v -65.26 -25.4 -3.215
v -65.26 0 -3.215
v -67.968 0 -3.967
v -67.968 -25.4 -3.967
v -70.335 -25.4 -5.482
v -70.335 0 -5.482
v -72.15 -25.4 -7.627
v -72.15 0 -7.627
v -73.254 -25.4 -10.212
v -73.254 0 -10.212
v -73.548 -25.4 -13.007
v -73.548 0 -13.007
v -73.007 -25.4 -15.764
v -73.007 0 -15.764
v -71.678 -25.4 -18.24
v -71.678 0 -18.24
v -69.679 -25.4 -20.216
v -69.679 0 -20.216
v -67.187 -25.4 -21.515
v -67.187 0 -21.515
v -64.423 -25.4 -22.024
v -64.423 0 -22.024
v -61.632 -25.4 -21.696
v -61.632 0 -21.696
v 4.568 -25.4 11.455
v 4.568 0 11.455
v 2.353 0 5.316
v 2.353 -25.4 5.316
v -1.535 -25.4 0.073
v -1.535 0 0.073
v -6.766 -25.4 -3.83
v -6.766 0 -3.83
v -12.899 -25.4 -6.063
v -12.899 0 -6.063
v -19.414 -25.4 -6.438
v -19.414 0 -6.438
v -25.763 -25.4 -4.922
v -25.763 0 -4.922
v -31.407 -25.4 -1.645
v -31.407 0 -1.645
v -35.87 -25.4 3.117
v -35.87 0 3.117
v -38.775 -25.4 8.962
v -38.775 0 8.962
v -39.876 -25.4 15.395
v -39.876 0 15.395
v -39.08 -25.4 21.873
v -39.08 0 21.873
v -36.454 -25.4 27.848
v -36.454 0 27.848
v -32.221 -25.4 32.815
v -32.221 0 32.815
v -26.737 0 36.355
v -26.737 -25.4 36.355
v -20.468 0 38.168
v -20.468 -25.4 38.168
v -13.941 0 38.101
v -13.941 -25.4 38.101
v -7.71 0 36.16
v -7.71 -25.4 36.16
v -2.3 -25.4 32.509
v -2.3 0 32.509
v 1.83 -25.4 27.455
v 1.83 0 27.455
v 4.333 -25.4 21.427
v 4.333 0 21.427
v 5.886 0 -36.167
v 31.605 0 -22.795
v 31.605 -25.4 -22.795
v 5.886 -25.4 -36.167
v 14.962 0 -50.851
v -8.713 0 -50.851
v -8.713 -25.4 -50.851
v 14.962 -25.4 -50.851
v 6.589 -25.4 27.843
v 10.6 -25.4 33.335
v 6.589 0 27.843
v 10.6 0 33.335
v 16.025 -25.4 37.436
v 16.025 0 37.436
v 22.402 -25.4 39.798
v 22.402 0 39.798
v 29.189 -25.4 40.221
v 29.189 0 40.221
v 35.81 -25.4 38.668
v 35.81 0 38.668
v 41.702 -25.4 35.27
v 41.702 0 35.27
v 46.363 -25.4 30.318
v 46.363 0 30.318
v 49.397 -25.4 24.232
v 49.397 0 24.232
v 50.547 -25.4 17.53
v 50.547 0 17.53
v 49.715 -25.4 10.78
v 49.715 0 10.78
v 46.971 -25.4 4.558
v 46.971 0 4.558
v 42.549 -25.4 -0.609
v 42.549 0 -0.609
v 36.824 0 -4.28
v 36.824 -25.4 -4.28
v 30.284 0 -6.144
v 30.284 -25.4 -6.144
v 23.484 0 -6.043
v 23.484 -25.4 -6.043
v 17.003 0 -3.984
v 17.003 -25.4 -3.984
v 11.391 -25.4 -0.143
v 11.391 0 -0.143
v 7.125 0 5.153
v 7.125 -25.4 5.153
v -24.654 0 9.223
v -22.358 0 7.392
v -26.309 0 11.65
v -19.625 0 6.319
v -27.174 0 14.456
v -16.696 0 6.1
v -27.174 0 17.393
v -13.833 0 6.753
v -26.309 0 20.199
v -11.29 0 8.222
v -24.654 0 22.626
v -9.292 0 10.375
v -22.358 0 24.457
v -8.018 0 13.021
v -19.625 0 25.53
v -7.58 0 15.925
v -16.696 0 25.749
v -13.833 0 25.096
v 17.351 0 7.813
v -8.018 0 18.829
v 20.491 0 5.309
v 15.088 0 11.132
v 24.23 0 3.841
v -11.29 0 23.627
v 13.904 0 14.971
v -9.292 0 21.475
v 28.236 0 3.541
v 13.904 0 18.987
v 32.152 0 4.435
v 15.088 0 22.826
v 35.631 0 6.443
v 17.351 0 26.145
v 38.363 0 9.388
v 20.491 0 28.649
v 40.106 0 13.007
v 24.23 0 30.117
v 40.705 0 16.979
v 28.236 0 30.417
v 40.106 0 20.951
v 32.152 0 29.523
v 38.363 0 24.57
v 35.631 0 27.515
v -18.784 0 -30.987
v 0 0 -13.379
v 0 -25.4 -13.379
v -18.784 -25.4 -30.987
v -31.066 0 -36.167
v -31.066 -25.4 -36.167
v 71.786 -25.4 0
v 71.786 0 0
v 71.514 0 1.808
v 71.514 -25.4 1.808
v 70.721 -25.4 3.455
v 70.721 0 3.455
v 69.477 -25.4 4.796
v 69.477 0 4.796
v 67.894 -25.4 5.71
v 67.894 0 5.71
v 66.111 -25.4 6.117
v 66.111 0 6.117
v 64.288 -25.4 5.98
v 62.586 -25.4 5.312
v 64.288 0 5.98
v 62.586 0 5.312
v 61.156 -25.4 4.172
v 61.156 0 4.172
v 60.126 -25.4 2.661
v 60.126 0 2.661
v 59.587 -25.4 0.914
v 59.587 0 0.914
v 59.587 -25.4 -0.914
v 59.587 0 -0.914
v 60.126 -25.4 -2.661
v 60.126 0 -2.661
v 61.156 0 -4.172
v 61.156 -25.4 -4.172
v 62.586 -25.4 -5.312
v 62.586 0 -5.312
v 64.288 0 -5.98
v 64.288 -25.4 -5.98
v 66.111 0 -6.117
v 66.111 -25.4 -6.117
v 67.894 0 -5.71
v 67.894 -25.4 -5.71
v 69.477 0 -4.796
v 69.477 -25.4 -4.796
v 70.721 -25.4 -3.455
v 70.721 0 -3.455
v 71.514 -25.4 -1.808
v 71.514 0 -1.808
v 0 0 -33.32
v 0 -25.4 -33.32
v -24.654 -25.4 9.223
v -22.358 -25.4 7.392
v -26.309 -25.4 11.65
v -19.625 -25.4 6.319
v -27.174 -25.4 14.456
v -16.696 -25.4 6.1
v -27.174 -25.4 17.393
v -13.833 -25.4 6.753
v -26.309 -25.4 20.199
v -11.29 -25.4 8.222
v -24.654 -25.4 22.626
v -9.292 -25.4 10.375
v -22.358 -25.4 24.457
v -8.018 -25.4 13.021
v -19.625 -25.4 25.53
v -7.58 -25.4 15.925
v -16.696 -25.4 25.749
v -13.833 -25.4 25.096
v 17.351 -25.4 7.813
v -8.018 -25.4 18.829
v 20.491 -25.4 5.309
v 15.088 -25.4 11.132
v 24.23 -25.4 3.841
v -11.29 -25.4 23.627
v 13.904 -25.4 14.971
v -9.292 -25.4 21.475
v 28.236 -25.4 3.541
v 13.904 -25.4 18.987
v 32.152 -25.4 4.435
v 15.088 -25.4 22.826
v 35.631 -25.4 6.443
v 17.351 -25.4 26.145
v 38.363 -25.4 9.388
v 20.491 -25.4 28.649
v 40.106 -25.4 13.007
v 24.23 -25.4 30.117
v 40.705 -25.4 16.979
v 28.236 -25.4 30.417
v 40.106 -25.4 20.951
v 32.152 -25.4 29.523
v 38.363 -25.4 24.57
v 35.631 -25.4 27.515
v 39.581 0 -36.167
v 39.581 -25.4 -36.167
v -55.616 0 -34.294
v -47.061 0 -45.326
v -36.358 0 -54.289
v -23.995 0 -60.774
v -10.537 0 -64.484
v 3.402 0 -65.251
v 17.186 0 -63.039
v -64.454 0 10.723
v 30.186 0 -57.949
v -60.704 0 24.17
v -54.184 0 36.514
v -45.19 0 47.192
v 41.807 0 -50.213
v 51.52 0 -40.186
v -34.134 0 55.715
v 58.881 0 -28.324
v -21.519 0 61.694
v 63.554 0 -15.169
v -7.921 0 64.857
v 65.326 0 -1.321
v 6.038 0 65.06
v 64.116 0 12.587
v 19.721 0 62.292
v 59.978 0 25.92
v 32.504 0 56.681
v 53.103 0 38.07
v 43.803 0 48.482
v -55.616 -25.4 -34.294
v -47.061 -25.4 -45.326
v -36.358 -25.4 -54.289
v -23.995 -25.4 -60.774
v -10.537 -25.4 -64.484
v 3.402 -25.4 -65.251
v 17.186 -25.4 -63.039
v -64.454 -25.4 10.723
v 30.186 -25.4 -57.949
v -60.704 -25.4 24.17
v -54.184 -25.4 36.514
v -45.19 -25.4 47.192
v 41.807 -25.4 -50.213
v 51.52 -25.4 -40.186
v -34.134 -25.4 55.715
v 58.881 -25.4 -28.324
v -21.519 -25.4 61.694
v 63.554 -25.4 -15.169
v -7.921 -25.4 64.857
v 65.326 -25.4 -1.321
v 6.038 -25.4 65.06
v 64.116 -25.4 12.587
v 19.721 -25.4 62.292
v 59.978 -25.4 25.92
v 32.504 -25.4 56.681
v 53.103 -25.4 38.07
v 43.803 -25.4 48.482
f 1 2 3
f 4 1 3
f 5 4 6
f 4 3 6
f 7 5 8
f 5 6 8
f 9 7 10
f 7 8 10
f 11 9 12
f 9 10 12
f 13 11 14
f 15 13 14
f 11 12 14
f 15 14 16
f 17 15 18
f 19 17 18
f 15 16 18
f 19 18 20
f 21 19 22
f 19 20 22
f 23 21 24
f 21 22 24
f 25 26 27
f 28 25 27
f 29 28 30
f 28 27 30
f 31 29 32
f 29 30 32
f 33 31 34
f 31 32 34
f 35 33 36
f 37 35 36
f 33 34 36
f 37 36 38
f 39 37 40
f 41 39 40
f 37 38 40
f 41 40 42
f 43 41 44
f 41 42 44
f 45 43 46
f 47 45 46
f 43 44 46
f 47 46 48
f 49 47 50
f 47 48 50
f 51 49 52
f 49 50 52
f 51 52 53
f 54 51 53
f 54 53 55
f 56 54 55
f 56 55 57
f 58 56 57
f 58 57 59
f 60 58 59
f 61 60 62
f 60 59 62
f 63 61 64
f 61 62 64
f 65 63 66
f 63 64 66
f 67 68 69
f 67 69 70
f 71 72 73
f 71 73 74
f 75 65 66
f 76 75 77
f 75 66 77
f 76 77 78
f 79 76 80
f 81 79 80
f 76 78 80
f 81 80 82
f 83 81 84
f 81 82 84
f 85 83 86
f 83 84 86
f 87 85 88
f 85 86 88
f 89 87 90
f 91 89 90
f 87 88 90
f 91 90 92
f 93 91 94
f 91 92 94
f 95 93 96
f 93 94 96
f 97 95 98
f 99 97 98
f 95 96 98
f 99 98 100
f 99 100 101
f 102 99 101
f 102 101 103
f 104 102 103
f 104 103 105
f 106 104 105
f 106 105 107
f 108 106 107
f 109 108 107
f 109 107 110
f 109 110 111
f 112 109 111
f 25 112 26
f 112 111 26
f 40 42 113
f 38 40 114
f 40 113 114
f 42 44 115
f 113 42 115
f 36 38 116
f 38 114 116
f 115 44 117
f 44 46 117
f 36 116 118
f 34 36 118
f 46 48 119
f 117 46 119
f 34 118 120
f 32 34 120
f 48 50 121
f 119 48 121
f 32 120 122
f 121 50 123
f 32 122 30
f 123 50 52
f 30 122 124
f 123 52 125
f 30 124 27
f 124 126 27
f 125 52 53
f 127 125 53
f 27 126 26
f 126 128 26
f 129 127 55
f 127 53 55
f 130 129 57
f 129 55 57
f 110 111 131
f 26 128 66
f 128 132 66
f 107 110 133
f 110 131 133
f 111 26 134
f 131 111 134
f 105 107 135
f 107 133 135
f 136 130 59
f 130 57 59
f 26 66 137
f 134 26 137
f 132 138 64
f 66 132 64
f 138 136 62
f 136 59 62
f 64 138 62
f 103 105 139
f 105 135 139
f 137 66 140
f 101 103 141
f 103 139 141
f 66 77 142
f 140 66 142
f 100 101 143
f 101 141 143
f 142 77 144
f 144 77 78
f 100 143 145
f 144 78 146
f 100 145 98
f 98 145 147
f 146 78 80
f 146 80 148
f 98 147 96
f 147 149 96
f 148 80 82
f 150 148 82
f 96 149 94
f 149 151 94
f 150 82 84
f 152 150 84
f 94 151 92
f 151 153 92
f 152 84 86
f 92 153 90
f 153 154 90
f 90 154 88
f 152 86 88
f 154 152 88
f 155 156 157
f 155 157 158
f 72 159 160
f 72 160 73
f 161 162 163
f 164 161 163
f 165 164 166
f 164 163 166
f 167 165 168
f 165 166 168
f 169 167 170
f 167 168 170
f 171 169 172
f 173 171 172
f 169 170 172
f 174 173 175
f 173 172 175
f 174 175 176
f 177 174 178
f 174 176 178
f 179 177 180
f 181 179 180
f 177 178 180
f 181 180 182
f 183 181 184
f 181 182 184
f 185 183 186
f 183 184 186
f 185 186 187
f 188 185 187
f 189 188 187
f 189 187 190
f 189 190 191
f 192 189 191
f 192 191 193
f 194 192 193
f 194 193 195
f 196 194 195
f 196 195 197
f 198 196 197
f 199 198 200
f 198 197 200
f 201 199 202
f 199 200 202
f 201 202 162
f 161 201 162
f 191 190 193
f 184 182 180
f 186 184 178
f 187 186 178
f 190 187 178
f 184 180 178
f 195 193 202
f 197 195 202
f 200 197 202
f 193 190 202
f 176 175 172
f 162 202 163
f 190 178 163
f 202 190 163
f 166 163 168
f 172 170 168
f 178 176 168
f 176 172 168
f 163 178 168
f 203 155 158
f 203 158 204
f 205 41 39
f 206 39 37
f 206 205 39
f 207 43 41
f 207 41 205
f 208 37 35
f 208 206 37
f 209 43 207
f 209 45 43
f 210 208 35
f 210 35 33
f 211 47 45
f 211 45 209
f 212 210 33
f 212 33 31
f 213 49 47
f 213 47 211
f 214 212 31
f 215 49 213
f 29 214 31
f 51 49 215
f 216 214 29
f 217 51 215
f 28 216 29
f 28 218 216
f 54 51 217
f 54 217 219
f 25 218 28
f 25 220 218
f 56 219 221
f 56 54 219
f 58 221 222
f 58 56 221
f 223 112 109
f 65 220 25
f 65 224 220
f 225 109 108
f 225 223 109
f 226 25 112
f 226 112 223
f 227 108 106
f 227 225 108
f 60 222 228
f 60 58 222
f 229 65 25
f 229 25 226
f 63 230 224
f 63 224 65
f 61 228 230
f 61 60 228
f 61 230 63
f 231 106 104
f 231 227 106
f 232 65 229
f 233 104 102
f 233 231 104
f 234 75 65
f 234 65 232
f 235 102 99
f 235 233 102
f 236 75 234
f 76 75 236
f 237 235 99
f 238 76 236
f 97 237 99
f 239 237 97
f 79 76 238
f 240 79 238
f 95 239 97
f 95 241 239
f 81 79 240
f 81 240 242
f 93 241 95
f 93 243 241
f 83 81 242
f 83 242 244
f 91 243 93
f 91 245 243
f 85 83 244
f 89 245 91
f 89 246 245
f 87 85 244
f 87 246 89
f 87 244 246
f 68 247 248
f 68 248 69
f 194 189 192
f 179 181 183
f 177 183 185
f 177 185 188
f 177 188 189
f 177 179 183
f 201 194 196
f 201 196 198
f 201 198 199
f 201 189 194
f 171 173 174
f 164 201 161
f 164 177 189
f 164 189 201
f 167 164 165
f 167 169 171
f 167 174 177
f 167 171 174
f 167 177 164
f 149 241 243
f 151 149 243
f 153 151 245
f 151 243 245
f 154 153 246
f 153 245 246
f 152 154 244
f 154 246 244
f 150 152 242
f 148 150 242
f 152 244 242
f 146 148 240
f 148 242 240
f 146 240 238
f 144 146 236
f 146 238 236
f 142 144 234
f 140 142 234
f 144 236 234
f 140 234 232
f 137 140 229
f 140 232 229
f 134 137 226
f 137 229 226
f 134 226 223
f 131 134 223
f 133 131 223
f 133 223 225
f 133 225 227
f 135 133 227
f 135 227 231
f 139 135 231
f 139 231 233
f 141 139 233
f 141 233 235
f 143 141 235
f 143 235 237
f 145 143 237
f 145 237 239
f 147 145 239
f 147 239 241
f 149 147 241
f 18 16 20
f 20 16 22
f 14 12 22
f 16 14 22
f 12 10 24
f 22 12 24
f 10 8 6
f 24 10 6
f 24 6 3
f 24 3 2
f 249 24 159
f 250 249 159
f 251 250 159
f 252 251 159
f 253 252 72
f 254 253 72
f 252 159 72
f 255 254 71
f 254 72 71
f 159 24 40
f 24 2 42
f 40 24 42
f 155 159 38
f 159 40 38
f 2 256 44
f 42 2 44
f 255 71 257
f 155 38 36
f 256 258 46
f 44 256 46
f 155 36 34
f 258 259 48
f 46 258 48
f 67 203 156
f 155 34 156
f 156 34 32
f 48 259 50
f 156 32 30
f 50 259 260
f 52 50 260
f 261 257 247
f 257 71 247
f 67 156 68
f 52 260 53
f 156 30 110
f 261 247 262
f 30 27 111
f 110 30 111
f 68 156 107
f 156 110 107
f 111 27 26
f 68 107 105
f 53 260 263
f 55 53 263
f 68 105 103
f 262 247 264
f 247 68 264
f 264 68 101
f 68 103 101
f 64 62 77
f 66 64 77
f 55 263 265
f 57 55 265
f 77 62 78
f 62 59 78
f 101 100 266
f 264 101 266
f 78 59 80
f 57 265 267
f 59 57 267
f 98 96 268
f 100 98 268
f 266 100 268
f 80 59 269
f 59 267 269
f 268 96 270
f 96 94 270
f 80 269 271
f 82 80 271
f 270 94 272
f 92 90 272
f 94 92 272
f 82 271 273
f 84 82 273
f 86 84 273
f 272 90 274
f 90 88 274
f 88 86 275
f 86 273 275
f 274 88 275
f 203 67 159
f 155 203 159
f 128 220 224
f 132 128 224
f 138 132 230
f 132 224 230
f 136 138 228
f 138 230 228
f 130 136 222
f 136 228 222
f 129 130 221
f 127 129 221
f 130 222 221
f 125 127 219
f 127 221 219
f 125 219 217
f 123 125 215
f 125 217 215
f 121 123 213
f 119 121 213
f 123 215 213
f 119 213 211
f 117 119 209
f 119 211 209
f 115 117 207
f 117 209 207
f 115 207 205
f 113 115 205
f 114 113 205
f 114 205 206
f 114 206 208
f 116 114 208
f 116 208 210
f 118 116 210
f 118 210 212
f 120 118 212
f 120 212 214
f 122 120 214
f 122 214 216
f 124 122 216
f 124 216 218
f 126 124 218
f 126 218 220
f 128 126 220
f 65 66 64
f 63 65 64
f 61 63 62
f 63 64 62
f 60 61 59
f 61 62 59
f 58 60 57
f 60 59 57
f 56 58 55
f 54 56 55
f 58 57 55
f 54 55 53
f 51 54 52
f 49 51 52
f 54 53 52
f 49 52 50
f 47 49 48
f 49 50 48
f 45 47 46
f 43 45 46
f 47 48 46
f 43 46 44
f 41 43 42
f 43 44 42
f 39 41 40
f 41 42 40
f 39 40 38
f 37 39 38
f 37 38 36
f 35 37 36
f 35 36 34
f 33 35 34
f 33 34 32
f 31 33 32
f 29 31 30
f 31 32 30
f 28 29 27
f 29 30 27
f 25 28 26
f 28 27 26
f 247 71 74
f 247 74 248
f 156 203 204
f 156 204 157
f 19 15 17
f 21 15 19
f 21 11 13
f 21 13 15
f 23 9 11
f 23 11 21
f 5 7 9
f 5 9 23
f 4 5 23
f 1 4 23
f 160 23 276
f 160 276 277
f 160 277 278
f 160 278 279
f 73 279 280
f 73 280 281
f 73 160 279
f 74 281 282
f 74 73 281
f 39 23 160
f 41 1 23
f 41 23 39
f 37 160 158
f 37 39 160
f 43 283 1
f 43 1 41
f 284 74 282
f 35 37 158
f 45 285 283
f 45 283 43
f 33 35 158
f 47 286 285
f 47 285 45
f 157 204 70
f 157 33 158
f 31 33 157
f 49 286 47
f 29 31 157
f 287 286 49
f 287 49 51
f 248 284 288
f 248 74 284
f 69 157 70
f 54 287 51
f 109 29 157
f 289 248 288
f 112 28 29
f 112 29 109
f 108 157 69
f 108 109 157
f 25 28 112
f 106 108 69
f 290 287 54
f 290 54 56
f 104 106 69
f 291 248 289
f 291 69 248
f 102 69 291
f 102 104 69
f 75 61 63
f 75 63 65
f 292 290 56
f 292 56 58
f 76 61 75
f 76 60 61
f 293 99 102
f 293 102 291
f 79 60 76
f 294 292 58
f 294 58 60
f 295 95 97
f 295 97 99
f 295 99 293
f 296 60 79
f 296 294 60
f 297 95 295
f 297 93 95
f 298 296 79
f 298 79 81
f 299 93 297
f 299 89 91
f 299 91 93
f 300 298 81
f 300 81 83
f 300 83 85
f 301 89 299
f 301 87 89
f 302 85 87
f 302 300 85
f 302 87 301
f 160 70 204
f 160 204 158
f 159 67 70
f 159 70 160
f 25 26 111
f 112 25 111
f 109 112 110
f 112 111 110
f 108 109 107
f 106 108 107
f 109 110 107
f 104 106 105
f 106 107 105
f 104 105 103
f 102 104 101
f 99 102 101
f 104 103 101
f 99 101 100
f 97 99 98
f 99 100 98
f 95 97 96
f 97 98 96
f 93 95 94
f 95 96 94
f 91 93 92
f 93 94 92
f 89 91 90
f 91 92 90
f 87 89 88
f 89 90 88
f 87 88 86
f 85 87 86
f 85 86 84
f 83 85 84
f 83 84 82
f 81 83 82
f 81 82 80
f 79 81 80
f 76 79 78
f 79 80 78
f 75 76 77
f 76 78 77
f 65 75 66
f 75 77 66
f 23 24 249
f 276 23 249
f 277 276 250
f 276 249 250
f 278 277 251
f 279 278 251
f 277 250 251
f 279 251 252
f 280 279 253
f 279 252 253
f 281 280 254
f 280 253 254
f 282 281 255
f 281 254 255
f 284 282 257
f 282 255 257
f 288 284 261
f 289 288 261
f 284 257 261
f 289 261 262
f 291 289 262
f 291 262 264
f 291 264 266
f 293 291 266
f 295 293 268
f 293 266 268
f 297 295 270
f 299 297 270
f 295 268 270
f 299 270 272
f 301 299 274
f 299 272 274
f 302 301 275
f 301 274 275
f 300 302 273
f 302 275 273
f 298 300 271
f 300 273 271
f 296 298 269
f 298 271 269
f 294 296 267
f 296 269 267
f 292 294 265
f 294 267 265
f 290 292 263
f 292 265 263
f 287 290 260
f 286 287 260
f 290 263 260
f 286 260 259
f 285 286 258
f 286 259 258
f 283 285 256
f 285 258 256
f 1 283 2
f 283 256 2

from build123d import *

# Parameters (mm, degrees)
F4_DEPTH  = 25.4
F1_R      = 6.1337389696
F5_R      = 9.8521642479
F5_R_2    = 13.4755875588
F6_DEPTH  = 50.8
F8_DEPTH  = 50.8
F10_DEPTH = 25.4


with BuildPart() as f4:
    # F0 (on Front) → F4 (new body)
    with BuildSketch(Plane.XZ):
        with BuildLine():
            ThreePointArc((-61.6319889699, -21.6963166615), (11.0053938043, -64.4058501091), (65.3393619578, 0))
            ThreePointArc((65.3393619578, 0), (-1.6077464964, 65.319578782), (-65.2602412343, -3.2145194194))
            ThreePointArc((-65.2602412343, -3.2145194194), (-57.8568542521, -5.5172266933), (-54.6735863066, -12.5868380535))
            ThreePointArc((-54.6735863066, -12.5868380535), (-56.6122050352, -18.3183729294), (-61.6319889699, -21.6963166615))
        make_face()
        Polygon((-18.7840107828, -30.9874843806), (0, -13.3792376146), (0, -33.3199203014), align=None, mode=Mode.SUBTRACT)
        with BuildLine():
            ThreePointArc((4.5682068913, 11.4550446749), (-39.8758272282, 15.3947175672), (4.3327601519, 21.427460987))
            ThreePointArc((4.3327601519, 21.427460987), (29.4635200031, 40.1961760553), (50.5534419729, 16.9790498912))
            ThreePointArc((50.5534419729, 16.9790498912), (30.0108964453, -6.1788671089), (4.5682068913, 11.4550446749))
        make_face(mode=Mode.SUBTRACT)
        with BuildLine():
            ThreePointArc((-61.6319889699, -21.6963166615), (-64.1155498212, -12.5868380535), (-65.2602412343, -3.2145194194))
            ThreePointArc((-65.2602412343, -3.2145194194), (-73.3806645084, -14.4057181605), (-61.6319889699, -21.6963166615))
        make_face()
        with BuildLine():
            ThreePointArc((-54.6735863066, -12.5868380535), (-57.8568542521, -5.5172266933), (-65.2602412343, -3.2145194194))
            ThreePointArc((-65.2602412343, -3.2145194194), (-64.1155498212, -12.5868380535), (-61.6319889699, -21.6963166615))
            ThreePointArc((-61.6319889699, -21.6963166615), (-56.6122050352, -18.3183729294), (-54.6735863066, -12.5868380535))
        make_face()
        Polygon((0, -33.3199203014), (0, -13.3792376146), (-18.7840107828, -30.9874843806), align=None)
    extrude(amount=F4_DEPTH)

    # F3 (on face) → F8 (cut)
    with BuildSketch(Plane.XZ):
        Polygon((0, -13.3792376146), (-18.7840107828, -30.9874843806), (0, -33.3199203014), align=None)
    extrude(amount=F8_DEPTH, mode=Mode.SUBTRACT)

    # F9 (on face) → F10 (cut)
    with BuildSketch(Plane.XZ):
        Polygon((39.5809486508, -36.1669994891), (31.6048823297, -22.7949712425), (5.886271596, -36.1669994891), (-18.26203987, -36.1669994891), (-31.0659818351, -36.1669994891), (-8.7129957974, -50.8514246749), (14.9622280356, -50.8514246749), align=None)
    extrude(amount=F10_DEPTH, mode=Mode.SUBTRACT)


with BuildPart() as f4b:
    # F1 (on Front) → F4, piece 2 (new body)
    with BuildSketch(Plane.XZ):
        with Locations((65.6527280807, 0)):
            Circle(F1_R)
    extrude(amount=F4_DEPTH)


with BuildPart() as f4c:
    # F2 (on face) → F4, piece 3 (new body)
    with BuildSketch(Plane.XZ):
        with BuildLine():
            ThreePointArc((4.3327601519, 21.427460987), (-39.8758272282, 15.3947175672), (4.5682068913, 11.4550446749))
            ThreePointArc((4.5682068913, 11.4550446749), (30.0108964453, -6.1788671089), (50.5534419729, 16.9790498912))
            ThreePointArc((50.5534419729, 16.9790498912), (29.4635200031, 40.1961760553), (4.3327601519, 21.427460987))
        make_face()
    extrude(amount=F4_DEPTH)

    # F5 (on face) → F6 (cut)
    with BuildSketch(Plane.XZ.offset(25.4)):
        with Locations((-17.4322258681, 15.9246064723)):
            Circle(F5_R)
        with Locations((27.2290371358, 16.9790498912)):
            Circle(F5_R_2)
    extrude(amount=-F6_DEPTH, mode=Mode.SUBTRACT)


solid = Compound([f4.part, f4b.part, f4c.part])
